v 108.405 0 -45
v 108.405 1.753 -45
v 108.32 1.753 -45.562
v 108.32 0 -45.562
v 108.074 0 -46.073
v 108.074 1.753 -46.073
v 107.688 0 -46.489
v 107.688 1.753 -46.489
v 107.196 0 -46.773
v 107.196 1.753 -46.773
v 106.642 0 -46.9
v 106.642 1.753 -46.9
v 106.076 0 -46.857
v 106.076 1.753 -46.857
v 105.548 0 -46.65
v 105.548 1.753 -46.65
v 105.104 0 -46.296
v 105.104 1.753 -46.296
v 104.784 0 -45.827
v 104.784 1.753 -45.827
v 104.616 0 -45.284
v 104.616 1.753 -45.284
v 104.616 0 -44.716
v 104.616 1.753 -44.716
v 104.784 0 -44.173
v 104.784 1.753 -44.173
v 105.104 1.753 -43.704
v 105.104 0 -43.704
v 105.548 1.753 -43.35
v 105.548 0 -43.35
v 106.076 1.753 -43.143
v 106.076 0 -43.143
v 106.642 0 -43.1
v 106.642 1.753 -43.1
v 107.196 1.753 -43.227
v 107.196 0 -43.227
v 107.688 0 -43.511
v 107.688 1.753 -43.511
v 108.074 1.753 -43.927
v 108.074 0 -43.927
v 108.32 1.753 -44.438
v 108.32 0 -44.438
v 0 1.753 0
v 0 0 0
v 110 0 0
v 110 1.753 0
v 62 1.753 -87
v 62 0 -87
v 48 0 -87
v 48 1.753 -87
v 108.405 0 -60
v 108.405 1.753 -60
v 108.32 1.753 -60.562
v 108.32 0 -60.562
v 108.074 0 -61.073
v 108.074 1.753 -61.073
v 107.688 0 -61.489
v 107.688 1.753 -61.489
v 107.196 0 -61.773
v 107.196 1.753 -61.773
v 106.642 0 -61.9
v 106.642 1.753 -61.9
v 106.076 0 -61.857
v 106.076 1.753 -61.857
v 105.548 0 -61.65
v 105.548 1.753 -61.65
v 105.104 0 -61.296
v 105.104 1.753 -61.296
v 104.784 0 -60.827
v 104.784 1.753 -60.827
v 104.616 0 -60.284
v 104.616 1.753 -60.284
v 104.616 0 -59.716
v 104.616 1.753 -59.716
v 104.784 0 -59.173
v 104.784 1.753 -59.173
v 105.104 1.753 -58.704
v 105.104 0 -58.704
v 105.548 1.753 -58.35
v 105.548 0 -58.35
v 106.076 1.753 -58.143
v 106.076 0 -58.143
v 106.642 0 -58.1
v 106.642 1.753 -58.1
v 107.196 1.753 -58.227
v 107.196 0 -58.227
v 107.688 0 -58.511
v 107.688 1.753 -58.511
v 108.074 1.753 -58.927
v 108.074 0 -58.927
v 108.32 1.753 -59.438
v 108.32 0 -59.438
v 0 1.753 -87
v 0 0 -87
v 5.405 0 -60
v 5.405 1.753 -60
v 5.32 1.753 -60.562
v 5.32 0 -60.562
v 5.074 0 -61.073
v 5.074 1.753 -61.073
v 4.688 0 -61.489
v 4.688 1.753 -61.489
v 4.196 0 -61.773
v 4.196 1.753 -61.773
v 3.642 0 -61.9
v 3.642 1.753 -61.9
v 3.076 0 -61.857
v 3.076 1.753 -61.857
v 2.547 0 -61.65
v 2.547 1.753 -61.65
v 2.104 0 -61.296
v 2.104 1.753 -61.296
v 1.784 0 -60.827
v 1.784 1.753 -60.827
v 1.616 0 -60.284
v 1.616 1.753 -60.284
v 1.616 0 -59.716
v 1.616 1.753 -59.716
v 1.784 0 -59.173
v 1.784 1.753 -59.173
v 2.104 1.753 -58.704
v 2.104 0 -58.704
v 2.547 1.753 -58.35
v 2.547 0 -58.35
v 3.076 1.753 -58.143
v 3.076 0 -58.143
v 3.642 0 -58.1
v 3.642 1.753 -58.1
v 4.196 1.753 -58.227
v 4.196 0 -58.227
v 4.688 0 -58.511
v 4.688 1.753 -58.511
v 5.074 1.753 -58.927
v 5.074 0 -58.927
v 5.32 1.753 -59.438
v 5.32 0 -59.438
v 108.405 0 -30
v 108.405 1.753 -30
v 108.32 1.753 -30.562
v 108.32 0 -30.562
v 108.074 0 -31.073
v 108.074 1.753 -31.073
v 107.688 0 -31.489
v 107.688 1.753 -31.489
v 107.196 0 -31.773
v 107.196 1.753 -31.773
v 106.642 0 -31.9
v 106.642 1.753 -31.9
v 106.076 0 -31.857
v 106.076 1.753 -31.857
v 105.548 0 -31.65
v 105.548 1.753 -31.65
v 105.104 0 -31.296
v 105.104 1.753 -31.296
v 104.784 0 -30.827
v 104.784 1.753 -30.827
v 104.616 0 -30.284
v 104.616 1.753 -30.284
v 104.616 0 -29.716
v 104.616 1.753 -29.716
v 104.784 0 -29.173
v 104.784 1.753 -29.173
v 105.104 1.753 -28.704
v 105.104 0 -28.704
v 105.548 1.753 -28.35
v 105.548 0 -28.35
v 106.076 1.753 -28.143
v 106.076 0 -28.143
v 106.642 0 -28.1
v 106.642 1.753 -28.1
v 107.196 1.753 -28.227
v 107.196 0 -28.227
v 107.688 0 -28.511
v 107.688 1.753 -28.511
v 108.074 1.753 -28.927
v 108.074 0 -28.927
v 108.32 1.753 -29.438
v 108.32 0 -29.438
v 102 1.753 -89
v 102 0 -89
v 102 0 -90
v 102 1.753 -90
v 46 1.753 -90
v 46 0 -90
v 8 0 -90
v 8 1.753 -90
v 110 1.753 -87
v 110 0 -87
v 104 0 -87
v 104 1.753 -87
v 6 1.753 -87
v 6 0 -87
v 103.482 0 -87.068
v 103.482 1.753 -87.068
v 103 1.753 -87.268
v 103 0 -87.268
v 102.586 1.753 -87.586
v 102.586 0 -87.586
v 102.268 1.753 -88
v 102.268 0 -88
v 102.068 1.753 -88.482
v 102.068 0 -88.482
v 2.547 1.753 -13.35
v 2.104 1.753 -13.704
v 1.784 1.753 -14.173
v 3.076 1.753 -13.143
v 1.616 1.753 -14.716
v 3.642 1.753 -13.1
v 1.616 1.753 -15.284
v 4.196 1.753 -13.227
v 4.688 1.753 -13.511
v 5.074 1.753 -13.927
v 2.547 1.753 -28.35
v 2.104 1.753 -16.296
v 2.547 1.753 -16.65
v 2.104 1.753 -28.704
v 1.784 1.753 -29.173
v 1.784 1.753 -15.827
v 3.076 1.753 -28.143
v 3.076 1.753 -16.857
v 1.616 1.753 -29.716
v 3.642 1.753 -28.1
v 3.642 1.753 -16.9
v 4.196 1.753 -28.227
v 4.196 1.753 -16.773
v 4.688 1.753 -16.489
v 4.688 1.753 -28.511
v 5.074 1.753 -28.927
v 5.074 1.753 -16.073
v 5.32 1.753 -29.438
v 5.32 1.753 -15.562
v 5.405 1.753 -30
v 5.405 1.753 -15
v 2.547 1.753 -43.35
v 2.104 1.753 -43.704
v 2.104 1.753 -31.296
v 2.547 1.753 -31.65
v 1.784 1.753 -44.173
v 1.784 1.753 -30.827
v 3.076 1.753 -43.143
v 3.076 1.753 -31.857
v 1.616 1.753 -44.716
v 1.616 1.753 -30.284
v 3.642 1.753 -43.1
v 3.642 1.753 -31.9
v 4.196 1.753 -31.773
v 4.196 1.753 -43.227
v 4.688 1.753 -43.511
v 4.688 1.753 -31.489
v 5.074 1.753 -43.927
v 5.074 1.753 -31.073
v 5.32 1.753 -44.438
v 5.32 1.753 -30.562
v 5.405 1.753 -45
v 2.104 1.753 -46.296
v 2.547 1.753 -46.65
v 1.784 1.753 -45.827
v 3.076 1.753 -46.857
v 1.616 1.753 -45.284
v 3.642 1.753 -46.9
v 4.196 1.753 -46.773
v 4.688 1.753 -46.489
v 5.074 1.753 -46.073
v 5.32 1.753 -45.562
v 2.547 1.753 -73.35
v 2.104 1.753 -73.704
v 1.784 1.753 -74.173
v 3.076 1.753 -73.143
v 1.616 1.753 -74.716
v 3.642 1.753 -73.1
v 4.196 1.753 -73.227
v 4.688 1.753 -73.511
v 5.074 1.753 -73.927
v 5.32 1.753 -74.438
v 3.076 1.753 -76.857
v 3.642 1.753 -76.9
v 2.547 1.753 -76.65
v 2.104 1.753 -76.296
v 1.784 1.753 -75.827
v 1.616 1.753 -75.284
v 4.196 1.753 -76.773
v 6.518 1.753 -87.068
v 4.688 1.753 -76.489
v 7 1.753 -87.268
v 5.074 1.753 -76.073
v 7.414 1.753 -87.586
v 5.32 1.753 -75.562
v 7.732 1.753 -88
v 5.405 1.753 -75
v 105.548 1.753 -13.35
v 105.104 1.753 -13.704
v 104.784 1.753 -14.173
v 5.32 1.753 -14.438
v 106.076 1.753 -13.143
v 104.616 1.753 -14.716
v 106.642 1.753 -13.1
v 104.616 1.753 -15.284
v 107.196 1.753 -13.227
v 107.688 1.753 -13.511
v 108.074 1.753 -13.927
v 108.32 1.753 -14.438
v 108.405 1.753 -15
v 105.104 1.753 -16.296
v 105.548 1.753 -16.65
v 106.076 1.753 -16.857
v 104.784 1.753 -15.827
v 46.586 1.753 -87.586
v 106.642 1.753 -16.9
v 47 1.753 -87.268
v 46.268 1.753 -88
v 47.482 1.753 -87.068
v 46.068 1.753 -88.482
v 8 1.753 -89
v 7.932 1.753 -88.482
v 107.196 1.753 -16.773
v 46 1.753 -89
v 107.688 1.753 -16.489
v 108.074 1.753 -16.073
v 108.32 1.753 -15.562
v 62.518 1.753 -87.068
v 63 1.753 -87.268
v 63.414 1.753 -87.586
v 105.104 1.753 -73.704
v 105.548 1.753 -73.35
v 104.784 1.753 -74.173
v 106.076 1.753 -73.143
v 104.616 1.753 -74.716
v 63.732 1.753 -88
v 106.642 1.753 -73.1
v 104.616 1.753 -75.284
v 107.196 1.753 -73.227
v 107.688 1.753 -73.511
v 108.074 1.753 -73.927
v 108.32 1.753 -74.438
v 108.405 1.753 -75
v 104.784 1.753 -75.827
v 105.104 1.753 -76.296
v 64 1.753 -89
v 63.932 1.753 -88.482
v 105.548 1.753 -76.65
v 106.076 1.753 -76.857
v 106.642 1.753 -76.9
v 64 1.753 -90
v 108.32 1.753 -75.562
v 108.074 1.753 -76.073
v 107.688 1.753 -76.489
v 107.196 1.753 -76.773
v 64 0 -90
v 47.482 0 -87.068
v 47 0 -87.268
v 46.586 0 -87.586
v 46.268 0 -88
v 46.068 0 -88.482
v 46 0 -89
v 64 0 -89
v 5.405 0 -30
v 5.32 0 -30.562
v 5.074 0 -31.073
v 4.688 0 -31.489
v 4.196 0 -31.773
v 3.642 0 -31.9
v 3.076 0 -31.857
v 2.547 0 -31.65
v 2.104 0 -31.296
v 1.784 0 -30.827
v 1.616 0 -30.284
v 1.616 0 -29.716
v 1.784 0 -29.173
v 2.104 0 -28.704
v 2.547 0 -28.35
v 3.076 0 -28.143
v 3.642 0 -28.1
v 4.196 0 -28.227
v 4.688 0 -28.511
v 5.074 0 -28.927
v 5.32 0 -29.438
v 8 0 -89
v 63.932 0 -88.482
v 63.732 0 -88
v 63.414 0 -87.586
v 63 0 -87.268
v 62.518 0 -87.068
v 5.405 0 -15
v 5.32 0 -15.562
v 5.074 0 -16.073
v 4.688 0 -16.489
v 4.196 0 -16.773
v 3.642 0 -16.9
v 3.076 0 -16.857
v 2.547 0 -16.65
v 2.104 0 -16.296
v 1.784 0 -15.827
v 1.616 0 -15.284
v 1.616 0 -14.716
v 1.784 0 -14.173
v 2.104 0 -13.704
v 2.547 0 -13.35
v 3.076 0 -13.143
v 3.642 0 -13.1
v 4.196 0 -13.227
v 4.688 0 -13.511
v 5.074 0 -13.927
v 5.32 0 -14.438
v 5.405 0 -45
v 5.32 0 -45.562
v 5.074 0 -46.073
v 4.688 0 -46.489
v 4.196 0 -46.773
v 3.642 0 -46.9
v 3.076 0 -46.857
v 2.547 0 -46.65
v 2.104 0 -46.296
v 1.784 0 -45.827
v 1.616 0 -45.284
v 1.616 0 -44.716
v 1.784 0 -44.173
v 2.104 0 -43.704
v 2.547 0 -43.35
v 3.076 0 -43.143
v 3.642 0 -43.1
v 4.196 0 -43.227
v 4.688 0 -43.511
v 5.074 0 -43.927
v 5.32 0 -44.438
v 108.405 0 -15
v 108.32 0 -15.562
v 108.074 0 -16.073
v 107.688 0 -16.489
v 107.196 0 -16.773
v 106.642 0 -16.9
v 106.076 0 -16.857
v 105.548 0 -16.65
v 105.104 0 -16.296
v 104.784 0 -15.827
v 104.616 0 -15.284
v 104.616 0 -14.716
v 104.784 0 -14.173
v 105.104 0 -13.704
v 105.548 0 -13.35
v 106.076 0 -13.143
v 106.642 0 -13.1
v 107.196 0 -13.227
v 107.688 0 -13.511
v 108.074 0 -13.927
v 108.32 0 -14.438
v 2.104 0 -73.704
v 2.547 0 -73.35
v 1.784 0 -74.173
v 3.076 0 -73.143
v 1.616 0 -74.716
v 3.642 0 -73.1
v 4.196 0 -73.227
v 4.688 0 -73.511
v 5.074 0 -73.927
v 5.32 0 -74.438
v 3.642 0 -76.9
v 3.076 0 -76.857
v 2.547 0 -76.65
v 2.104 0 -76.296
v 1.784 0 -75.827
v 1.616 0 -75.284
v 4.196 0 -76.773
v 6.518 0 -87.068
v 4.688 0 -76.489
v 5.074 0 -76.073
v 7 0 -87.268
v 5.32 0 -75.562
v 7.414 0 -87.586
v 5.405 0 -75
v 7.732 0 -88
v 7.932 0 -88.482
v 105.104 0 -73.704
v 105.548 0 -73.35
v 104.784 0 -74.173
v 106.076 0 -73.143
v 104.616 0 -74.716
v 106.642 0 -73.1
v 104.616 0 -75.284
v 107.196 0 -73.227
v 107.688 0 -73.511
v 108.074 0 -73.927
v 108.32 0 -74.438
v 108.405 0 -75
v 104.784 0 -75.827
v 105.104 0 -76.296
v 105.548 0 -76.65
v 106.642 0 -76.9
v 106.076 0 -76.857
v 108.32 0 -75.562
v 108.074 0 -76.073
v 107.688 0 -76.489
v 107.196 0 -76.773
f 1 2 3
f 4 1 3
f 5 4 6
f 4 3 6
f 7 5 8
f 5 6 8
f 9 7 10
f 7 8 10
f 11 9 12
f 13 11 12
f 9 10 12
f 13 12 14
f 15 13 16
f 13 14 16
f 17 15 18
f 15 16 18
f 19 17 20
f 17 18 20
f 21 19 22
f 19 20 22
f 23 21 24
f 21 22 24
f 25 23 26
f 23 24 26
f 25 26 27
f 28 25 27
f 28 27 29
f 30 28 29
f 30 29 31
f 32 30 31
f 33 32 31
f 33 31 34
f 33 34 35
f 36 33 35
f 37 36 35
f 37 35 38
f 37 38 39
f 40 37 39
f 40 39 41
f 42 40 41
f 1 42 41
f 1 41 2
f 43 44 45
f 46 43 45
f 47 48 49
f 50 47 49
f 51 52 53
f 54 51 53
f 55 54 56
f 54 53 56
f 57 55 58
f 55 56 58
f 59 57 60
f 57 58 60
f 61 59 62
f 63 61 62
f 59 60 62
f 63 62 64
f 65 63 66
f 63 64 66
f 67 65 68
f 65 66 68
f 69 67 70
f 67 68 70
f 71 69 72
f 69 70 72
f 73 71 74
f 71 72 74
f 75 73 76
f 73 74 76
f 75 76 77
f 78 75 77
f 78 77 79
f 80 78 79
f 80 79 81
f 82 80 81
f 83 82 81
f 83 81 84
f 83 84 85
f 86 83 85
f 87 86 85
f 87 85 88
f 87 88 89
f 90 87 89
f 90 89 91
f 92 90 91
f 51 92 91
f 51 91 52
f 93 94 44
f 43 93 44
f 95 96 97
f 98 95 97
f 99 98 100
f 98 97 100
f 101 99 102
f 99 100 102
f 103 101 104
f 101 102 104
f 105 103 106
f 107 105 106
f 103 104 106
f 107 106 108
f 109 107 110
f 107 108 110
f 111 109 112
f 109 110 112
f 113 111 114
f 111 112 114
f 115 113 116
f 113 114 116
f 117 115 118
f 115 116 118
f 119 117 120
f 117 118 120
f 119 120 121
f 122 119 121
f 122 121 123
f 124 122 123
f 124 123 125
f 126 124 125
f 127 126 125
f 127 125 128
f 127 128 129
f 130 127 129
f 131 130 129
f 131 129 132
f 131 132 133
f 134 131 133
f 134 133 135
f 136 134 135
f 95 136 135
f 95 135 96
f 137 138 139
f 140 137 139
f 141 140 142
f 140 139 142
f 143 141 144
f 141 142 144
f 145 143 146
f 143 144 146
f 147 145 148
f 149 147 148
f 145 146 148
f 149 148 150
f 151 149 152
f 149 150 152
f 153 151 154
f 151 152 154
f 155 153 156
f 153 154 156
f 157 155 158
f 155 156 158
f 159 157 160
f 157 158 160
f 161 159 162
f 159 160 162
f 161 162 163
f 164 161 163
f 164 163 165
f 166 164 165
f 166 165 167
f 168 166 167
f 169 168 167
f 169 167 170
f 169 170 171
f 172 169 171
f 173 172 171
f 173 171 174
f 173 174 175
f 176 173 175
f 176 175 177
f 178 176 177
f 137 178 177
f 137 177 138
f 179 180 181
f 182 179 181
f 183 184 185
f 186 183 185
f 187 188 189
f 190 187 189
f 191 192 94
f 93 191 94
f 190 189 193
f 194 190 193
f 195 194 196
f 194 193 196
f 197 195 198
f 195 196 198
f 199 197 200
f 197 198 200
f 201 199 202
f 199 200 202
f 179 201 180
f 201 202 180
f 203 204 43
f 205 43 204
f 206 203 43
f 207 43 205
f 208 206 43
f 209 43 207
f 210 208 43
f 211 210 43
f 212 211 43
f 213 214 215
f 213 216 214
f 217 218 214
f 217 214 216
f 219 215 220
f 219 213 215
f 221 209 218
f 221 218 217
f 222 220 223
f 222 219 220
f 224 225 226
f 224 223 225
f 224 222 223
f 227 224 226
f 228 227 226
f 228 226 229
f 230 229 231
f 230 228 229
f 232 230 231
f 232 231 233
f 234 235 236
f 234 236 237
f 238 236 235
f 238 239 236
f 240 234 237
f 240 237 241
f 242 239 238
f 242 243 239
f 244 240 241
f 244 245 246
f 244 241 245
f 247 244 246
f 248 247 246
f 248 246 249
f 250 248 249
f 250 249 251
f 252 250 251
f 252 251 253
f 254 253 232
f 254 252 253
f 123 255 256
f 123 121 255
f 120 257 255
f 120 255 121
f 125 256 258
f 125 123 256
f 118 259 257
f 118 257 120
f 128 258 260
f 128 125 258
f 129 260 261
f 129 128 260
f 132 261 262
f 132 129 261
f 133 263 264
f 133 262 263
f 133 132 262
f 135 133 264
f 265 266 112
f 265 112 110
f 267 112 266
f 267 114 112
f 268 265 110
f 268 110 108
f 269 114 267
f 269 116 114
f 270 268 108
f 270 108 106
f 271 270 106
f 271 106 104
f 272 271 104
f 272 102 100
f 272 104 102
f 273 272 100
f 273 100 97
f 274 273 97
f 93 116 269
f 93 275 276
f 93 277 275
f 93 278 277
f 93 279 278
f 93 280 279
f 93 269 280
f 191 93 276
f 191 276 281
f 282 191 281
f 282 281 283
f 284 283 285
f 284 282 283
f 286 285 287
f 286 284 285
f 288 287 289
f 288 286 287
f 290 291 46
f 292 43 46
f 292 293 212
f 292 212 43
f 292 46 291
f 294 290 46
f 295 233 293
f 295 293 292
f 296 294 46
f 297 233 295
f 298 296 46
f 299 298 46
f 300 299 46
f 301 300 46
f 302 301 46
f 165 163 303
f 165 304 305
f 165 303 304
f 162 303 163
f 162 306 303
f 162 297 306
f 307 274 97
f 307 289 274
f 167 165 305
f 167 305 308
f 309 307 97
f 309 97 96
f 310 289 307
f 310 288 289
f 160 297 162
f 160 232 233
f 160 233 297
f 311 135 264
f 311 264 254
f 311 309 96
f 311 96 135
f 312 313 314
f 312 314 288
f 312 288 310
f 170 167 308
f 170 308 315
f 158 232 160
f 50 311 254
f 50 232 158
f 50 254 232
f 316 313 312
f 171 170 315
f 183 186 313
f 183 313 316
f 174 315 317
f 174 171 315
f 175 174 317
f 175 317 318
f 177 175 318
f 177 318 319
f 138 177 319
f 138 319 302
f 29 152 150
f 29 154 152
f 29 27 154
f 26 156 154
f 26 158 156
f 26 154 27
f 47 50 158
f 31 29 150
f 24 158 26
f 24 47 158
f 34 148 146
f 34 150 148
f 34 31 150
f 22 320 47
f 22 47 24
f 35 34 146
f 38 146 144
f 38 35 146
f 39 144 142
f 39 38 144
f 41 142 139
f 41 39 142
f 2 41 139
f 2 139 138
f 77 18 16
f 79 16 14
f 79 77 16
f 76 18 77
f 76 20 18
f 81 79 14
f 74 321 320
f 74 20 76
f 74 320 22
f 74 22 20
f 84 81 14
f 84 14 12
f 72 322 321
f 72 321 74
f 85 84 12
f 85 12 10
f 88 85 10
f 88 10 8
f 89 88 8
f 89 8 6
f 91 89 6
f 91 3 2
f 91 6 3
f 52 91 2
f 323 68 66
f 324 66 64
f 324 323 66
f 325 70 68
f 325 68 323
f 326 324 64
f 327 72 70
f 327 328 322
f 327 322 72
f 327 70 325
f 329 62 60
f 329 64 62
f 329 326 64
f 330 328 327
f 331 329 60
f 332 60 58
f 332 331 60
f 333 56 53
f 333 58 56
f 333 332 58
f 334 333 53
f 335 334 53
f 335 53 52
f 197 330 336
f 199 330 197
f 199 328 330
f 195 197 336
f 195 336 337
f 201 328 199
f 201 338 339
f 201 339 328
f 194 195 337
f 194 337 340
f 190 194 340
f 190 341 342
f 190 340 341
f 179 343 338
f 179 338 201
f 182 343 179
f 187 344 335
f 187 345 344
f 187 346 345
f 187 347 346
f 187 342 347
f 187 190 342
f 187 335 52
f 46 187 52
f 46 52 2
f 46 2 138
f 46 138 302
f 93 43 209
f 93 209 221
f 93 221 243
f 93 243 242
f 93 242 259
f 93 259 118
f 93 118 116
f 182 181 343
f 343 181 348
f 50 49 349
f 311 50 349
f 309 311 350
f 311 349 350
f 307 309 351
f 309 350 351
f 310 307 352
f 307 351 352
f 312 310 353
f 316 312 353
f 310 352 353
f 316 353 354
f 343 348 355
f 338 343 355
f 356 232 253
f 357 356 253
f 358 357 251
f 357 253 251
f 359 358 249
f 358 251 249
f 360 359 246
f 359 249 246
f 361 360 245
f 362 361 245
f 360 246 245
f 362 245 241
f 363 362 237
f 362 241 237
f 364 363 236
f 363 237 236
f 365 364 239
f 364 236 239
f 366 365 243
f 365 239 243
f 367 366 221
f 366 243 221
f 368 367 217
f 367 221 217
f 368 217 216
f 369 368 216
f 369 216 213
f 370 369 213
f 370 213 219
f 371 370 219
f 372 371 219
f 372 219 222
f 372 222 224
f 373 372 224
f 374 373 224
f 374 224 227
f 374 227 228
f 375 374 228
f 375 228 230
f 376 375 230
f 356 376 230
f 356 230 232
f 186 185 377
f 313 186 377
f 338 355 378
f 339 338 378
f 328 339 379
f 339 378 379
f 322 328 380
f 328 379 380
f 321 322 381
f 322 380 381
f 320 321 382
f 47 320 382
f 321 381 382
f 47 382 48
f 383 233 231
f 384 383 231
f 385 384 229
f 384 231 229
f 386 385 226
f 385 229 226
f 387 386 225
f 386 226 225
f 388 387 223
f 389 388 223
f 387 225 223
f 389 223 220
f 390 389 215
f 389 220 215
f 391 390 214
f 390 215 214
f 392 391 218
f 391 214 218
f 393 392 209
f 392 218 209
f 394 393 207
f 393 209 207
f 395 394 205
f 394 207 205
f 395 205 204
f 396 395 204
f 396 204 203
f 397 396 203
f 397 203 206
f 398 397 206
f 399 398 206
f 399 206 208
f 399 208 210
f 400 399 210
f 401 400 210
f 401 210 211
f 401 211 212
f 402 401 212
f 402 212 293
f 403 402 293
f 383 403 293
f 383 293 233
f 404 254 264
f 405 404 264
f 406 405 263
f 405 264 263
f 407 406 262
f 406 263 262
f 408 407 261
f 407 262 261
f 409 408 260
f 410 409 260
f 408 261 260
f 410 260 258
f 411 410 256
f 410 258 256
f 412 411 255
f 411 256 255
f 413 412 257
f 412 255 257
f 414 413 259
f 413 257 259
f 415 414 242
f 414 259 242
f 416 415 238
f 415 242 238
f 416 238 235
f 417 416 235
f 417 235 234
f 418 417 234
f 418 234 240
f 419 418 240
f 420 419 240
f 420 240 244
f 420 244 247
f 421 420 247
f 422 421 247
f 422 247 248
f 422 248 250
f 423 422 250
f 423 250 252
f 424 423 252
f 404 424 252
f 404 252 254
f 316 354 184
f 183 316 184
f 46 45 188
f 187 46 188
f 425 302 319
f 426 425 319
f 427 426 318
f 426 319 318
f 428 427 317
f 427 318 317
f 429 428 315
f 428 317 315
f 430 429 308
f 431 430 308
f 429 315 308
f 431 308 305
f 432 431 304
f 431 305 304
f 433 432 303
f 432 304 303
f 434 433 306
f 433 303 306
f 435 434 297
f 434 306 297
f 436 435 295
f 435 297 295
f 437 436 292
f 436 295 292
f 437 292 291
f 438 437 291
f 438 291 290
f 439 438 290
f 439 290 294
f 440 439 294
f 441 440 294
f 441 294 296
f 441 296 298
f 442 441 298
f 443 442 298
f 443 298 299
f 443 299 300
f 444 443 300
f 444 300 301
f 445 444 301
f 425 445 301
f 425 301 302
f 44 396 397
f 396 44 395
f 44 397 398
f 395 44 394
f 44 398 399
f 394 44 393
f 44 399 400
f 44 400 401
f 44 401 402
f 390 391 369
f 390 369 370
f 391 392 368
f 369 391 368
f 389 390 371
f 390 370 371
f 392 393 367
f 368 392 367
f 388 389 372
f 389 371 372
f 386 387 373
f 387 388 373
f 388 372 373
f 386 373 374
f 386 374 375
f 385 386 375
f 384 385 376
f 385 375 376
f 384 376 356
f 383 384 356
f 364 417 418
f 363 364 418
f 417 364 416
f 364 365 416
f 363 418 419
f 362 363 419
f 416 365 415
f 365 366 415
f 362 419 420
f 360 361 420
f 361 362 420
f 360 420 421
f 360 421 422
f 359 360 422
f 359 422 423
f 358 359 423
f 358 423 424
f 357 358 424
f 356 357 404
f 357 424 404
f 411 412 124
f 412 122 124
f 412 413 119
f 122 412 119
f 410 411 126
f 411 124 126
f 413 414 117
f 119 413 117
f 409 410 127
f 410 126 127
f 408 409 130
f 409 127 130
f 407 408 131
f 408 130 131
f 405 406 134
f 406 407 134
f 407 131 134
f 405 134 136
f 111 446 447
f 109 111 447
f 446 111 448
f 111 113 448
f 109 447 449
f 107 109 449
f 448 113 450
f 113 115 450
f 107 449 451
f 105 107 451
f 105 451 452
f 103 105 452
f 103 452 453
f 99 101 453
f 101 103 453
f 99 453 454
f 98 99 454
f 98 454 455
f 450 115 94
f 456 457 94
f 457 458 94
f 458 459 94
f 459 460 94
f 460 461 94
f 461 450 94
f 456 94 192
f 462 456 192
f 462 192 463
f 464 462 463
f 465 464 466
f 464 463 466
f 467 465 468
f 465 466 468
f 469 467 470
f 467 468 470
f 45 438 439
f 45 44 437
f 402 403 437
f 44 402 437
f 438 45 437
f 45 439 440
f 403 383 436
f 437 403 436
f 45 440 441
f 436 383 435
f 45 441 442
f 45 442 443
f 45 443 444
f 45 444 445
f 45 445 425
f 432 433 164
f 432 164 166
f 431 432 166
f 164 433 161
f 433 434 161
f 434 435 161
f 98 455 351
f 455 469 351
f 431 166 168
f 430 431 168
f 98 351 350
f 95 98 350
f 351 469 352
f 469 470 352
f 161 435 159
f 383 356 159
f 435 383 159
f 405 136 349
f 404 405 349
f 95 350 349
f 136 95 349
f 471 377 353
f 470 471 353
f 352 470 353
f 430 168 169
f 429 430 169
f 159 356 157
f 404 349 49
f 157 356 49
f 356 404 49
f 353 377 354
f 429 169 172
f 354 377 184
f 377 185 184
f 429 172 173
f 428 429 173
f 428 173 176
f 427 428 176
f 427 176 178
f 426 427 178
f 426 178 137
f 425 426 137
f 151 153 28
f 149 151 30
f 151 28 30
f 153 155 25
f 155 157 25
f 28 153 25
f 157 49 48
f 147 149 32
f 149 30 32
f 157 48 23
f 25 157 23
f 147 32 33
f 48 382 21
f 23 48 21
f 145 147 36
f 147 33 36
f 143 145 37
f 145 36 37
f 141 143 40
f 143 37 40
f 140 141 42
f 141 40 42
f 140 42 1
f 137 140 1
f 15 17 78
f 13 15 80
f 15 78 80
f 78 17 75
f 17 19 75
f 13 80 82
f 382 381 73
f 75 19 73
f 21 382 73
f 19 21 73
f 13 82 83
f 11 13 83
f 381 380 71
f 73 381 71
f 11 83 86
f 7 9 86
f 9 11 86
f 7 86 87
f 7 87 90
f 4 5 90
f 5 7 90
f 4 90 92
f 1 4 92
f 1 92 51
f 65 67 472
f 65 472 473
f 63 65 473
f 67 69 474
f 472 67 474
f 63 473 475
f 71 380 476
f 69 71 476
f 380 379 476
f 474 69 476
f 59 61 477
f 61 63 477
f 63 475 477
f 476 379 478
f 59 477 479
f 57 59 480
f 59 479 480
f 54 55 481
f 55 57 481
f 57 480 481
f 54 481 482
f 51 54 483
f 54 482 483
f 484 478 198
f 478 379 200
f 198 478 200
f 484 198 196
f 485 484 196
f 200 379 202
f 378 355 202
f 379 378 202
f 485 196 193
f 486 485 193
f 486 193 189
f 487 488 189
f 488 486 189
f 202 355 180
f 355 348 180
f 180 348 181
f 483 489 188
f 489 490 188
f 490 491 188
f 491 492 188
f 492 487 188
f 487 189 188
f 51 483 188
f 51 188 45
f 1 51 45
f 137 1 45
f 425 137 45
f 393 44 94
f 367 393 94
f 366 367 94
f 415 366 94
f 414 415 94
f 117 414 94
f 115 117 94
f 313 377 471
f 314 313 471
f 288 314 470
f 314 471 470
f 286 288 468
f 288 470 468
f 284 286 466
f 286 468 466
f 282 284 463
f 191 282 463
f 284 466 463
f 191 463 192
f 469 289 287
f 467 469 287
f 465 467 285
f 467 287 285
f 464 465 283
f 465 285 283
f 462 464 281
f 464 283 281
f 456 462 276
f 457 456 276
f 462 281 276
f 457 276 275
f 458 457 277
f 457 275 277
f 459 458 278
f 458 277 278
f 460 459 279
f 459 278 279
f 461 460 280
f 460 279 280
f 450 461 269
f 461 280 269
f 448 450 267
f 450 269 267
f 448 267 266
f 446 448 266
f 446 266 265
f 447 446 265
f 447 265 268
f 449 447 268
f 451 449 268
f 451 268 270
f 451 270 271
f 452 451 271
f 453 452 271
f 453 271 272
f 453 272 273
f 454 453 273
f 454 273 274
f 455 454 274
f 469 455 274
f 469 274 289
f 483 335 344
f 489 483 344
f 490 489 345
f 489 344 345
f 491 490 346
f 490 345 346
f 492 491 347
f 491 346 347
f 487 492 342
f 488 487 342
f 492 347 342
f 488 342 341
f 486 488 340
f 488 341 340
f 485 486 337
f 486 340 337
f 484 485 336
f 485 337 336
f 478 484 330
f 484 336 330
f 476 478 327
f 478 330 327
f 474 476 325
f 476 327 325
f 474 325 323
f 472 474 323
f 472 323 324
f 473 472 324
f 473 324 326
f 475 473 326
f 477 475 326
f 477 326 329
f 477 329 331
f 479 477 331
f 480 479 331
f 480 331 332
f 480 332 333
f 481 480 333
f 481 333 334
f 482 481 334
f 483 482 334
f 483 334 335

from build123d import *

# Parameters (mm, degrees)
FR4_DEPTH          = 1.7526
SKETCH7_R          = 1.905
CUT_EXTRUDE1_DEPTH = 2.7526


with BuildPart() as part:
    # Sketch1 → FR4 (new body)
    with BuildSketch(Plane(origin=(0, 0, 0), x_dir=(1, 0, 0), z_dir=(0, 1, 0))):
        with BuildLine():
            Line((0, 0), (110, 0))
            Line((110, 0), (110, 87))
            Line((110, 87), (104, 87))
            ThreePointArc((104, 87), (102.585786438, 87.585786438), (102, 89))
            Line((102, 89), (102, 90))
            Line((102, 90), (64, 90))
            Line((64, 90), (64, 89))
            ThreePointArc((64, 89), (63.414213562, 87.585786438), (62, 87))
            Line((62, 87), (48, 87))
            ThreePointArc((48, 87), (46.585786438, 87.585786438), (46, 89))
            Line((46, 89), (46, 90))
            Line((46, 90), (8, 90))
            Line((8, 90), (8, 89))
            ThreePointArc((8, 89), (7.414213562, 87.585786438), (6, 87))
            Line((6, 87), (0, 87))
            Line((0, 87), (0, 0))
        make_face()
    extrude(amount=FR4_DEPTH)

    # Sketch7 → Cut-Extrude1 (cut, through all)
    with BuildSketch(Plane(origin=(0, 1.7526, 0), x_dir=(1, 0, 0), z_dir=(0, 1, 0))):
        with Locations((3.5, 15)):
            Circle(SKETCH7_R)
        with Locations((106.5, 15)):
            Circle(SKETCH7_R)
        with Locations((106.5, 30)):
            Circle(SKETCH7_R)
        with Locations((106.5, 45)):
            Circle(SKETCH7_R)
        with Locations((106.5, 60)):
            Circle(SKETCH7_R)
        with Locations((106.5, 75)):
            Circle(SKETCH7_R)
        with Locations((3.5, 30)):
            Circle(SKETCH7_R)
        with Locations((3.5, 45)):
            Circle(SKETCH7_R)
        with Locations((3.5, 60)):
            Circle(SKETCH7_R)
        with Locations((3.5, 75)):
            Circle(SKETCH7_R)
    extrude(amount=-CUT_EXTRUDE1_DEPTH, mode=Mode.SUBTRACT)


solid = part.part
